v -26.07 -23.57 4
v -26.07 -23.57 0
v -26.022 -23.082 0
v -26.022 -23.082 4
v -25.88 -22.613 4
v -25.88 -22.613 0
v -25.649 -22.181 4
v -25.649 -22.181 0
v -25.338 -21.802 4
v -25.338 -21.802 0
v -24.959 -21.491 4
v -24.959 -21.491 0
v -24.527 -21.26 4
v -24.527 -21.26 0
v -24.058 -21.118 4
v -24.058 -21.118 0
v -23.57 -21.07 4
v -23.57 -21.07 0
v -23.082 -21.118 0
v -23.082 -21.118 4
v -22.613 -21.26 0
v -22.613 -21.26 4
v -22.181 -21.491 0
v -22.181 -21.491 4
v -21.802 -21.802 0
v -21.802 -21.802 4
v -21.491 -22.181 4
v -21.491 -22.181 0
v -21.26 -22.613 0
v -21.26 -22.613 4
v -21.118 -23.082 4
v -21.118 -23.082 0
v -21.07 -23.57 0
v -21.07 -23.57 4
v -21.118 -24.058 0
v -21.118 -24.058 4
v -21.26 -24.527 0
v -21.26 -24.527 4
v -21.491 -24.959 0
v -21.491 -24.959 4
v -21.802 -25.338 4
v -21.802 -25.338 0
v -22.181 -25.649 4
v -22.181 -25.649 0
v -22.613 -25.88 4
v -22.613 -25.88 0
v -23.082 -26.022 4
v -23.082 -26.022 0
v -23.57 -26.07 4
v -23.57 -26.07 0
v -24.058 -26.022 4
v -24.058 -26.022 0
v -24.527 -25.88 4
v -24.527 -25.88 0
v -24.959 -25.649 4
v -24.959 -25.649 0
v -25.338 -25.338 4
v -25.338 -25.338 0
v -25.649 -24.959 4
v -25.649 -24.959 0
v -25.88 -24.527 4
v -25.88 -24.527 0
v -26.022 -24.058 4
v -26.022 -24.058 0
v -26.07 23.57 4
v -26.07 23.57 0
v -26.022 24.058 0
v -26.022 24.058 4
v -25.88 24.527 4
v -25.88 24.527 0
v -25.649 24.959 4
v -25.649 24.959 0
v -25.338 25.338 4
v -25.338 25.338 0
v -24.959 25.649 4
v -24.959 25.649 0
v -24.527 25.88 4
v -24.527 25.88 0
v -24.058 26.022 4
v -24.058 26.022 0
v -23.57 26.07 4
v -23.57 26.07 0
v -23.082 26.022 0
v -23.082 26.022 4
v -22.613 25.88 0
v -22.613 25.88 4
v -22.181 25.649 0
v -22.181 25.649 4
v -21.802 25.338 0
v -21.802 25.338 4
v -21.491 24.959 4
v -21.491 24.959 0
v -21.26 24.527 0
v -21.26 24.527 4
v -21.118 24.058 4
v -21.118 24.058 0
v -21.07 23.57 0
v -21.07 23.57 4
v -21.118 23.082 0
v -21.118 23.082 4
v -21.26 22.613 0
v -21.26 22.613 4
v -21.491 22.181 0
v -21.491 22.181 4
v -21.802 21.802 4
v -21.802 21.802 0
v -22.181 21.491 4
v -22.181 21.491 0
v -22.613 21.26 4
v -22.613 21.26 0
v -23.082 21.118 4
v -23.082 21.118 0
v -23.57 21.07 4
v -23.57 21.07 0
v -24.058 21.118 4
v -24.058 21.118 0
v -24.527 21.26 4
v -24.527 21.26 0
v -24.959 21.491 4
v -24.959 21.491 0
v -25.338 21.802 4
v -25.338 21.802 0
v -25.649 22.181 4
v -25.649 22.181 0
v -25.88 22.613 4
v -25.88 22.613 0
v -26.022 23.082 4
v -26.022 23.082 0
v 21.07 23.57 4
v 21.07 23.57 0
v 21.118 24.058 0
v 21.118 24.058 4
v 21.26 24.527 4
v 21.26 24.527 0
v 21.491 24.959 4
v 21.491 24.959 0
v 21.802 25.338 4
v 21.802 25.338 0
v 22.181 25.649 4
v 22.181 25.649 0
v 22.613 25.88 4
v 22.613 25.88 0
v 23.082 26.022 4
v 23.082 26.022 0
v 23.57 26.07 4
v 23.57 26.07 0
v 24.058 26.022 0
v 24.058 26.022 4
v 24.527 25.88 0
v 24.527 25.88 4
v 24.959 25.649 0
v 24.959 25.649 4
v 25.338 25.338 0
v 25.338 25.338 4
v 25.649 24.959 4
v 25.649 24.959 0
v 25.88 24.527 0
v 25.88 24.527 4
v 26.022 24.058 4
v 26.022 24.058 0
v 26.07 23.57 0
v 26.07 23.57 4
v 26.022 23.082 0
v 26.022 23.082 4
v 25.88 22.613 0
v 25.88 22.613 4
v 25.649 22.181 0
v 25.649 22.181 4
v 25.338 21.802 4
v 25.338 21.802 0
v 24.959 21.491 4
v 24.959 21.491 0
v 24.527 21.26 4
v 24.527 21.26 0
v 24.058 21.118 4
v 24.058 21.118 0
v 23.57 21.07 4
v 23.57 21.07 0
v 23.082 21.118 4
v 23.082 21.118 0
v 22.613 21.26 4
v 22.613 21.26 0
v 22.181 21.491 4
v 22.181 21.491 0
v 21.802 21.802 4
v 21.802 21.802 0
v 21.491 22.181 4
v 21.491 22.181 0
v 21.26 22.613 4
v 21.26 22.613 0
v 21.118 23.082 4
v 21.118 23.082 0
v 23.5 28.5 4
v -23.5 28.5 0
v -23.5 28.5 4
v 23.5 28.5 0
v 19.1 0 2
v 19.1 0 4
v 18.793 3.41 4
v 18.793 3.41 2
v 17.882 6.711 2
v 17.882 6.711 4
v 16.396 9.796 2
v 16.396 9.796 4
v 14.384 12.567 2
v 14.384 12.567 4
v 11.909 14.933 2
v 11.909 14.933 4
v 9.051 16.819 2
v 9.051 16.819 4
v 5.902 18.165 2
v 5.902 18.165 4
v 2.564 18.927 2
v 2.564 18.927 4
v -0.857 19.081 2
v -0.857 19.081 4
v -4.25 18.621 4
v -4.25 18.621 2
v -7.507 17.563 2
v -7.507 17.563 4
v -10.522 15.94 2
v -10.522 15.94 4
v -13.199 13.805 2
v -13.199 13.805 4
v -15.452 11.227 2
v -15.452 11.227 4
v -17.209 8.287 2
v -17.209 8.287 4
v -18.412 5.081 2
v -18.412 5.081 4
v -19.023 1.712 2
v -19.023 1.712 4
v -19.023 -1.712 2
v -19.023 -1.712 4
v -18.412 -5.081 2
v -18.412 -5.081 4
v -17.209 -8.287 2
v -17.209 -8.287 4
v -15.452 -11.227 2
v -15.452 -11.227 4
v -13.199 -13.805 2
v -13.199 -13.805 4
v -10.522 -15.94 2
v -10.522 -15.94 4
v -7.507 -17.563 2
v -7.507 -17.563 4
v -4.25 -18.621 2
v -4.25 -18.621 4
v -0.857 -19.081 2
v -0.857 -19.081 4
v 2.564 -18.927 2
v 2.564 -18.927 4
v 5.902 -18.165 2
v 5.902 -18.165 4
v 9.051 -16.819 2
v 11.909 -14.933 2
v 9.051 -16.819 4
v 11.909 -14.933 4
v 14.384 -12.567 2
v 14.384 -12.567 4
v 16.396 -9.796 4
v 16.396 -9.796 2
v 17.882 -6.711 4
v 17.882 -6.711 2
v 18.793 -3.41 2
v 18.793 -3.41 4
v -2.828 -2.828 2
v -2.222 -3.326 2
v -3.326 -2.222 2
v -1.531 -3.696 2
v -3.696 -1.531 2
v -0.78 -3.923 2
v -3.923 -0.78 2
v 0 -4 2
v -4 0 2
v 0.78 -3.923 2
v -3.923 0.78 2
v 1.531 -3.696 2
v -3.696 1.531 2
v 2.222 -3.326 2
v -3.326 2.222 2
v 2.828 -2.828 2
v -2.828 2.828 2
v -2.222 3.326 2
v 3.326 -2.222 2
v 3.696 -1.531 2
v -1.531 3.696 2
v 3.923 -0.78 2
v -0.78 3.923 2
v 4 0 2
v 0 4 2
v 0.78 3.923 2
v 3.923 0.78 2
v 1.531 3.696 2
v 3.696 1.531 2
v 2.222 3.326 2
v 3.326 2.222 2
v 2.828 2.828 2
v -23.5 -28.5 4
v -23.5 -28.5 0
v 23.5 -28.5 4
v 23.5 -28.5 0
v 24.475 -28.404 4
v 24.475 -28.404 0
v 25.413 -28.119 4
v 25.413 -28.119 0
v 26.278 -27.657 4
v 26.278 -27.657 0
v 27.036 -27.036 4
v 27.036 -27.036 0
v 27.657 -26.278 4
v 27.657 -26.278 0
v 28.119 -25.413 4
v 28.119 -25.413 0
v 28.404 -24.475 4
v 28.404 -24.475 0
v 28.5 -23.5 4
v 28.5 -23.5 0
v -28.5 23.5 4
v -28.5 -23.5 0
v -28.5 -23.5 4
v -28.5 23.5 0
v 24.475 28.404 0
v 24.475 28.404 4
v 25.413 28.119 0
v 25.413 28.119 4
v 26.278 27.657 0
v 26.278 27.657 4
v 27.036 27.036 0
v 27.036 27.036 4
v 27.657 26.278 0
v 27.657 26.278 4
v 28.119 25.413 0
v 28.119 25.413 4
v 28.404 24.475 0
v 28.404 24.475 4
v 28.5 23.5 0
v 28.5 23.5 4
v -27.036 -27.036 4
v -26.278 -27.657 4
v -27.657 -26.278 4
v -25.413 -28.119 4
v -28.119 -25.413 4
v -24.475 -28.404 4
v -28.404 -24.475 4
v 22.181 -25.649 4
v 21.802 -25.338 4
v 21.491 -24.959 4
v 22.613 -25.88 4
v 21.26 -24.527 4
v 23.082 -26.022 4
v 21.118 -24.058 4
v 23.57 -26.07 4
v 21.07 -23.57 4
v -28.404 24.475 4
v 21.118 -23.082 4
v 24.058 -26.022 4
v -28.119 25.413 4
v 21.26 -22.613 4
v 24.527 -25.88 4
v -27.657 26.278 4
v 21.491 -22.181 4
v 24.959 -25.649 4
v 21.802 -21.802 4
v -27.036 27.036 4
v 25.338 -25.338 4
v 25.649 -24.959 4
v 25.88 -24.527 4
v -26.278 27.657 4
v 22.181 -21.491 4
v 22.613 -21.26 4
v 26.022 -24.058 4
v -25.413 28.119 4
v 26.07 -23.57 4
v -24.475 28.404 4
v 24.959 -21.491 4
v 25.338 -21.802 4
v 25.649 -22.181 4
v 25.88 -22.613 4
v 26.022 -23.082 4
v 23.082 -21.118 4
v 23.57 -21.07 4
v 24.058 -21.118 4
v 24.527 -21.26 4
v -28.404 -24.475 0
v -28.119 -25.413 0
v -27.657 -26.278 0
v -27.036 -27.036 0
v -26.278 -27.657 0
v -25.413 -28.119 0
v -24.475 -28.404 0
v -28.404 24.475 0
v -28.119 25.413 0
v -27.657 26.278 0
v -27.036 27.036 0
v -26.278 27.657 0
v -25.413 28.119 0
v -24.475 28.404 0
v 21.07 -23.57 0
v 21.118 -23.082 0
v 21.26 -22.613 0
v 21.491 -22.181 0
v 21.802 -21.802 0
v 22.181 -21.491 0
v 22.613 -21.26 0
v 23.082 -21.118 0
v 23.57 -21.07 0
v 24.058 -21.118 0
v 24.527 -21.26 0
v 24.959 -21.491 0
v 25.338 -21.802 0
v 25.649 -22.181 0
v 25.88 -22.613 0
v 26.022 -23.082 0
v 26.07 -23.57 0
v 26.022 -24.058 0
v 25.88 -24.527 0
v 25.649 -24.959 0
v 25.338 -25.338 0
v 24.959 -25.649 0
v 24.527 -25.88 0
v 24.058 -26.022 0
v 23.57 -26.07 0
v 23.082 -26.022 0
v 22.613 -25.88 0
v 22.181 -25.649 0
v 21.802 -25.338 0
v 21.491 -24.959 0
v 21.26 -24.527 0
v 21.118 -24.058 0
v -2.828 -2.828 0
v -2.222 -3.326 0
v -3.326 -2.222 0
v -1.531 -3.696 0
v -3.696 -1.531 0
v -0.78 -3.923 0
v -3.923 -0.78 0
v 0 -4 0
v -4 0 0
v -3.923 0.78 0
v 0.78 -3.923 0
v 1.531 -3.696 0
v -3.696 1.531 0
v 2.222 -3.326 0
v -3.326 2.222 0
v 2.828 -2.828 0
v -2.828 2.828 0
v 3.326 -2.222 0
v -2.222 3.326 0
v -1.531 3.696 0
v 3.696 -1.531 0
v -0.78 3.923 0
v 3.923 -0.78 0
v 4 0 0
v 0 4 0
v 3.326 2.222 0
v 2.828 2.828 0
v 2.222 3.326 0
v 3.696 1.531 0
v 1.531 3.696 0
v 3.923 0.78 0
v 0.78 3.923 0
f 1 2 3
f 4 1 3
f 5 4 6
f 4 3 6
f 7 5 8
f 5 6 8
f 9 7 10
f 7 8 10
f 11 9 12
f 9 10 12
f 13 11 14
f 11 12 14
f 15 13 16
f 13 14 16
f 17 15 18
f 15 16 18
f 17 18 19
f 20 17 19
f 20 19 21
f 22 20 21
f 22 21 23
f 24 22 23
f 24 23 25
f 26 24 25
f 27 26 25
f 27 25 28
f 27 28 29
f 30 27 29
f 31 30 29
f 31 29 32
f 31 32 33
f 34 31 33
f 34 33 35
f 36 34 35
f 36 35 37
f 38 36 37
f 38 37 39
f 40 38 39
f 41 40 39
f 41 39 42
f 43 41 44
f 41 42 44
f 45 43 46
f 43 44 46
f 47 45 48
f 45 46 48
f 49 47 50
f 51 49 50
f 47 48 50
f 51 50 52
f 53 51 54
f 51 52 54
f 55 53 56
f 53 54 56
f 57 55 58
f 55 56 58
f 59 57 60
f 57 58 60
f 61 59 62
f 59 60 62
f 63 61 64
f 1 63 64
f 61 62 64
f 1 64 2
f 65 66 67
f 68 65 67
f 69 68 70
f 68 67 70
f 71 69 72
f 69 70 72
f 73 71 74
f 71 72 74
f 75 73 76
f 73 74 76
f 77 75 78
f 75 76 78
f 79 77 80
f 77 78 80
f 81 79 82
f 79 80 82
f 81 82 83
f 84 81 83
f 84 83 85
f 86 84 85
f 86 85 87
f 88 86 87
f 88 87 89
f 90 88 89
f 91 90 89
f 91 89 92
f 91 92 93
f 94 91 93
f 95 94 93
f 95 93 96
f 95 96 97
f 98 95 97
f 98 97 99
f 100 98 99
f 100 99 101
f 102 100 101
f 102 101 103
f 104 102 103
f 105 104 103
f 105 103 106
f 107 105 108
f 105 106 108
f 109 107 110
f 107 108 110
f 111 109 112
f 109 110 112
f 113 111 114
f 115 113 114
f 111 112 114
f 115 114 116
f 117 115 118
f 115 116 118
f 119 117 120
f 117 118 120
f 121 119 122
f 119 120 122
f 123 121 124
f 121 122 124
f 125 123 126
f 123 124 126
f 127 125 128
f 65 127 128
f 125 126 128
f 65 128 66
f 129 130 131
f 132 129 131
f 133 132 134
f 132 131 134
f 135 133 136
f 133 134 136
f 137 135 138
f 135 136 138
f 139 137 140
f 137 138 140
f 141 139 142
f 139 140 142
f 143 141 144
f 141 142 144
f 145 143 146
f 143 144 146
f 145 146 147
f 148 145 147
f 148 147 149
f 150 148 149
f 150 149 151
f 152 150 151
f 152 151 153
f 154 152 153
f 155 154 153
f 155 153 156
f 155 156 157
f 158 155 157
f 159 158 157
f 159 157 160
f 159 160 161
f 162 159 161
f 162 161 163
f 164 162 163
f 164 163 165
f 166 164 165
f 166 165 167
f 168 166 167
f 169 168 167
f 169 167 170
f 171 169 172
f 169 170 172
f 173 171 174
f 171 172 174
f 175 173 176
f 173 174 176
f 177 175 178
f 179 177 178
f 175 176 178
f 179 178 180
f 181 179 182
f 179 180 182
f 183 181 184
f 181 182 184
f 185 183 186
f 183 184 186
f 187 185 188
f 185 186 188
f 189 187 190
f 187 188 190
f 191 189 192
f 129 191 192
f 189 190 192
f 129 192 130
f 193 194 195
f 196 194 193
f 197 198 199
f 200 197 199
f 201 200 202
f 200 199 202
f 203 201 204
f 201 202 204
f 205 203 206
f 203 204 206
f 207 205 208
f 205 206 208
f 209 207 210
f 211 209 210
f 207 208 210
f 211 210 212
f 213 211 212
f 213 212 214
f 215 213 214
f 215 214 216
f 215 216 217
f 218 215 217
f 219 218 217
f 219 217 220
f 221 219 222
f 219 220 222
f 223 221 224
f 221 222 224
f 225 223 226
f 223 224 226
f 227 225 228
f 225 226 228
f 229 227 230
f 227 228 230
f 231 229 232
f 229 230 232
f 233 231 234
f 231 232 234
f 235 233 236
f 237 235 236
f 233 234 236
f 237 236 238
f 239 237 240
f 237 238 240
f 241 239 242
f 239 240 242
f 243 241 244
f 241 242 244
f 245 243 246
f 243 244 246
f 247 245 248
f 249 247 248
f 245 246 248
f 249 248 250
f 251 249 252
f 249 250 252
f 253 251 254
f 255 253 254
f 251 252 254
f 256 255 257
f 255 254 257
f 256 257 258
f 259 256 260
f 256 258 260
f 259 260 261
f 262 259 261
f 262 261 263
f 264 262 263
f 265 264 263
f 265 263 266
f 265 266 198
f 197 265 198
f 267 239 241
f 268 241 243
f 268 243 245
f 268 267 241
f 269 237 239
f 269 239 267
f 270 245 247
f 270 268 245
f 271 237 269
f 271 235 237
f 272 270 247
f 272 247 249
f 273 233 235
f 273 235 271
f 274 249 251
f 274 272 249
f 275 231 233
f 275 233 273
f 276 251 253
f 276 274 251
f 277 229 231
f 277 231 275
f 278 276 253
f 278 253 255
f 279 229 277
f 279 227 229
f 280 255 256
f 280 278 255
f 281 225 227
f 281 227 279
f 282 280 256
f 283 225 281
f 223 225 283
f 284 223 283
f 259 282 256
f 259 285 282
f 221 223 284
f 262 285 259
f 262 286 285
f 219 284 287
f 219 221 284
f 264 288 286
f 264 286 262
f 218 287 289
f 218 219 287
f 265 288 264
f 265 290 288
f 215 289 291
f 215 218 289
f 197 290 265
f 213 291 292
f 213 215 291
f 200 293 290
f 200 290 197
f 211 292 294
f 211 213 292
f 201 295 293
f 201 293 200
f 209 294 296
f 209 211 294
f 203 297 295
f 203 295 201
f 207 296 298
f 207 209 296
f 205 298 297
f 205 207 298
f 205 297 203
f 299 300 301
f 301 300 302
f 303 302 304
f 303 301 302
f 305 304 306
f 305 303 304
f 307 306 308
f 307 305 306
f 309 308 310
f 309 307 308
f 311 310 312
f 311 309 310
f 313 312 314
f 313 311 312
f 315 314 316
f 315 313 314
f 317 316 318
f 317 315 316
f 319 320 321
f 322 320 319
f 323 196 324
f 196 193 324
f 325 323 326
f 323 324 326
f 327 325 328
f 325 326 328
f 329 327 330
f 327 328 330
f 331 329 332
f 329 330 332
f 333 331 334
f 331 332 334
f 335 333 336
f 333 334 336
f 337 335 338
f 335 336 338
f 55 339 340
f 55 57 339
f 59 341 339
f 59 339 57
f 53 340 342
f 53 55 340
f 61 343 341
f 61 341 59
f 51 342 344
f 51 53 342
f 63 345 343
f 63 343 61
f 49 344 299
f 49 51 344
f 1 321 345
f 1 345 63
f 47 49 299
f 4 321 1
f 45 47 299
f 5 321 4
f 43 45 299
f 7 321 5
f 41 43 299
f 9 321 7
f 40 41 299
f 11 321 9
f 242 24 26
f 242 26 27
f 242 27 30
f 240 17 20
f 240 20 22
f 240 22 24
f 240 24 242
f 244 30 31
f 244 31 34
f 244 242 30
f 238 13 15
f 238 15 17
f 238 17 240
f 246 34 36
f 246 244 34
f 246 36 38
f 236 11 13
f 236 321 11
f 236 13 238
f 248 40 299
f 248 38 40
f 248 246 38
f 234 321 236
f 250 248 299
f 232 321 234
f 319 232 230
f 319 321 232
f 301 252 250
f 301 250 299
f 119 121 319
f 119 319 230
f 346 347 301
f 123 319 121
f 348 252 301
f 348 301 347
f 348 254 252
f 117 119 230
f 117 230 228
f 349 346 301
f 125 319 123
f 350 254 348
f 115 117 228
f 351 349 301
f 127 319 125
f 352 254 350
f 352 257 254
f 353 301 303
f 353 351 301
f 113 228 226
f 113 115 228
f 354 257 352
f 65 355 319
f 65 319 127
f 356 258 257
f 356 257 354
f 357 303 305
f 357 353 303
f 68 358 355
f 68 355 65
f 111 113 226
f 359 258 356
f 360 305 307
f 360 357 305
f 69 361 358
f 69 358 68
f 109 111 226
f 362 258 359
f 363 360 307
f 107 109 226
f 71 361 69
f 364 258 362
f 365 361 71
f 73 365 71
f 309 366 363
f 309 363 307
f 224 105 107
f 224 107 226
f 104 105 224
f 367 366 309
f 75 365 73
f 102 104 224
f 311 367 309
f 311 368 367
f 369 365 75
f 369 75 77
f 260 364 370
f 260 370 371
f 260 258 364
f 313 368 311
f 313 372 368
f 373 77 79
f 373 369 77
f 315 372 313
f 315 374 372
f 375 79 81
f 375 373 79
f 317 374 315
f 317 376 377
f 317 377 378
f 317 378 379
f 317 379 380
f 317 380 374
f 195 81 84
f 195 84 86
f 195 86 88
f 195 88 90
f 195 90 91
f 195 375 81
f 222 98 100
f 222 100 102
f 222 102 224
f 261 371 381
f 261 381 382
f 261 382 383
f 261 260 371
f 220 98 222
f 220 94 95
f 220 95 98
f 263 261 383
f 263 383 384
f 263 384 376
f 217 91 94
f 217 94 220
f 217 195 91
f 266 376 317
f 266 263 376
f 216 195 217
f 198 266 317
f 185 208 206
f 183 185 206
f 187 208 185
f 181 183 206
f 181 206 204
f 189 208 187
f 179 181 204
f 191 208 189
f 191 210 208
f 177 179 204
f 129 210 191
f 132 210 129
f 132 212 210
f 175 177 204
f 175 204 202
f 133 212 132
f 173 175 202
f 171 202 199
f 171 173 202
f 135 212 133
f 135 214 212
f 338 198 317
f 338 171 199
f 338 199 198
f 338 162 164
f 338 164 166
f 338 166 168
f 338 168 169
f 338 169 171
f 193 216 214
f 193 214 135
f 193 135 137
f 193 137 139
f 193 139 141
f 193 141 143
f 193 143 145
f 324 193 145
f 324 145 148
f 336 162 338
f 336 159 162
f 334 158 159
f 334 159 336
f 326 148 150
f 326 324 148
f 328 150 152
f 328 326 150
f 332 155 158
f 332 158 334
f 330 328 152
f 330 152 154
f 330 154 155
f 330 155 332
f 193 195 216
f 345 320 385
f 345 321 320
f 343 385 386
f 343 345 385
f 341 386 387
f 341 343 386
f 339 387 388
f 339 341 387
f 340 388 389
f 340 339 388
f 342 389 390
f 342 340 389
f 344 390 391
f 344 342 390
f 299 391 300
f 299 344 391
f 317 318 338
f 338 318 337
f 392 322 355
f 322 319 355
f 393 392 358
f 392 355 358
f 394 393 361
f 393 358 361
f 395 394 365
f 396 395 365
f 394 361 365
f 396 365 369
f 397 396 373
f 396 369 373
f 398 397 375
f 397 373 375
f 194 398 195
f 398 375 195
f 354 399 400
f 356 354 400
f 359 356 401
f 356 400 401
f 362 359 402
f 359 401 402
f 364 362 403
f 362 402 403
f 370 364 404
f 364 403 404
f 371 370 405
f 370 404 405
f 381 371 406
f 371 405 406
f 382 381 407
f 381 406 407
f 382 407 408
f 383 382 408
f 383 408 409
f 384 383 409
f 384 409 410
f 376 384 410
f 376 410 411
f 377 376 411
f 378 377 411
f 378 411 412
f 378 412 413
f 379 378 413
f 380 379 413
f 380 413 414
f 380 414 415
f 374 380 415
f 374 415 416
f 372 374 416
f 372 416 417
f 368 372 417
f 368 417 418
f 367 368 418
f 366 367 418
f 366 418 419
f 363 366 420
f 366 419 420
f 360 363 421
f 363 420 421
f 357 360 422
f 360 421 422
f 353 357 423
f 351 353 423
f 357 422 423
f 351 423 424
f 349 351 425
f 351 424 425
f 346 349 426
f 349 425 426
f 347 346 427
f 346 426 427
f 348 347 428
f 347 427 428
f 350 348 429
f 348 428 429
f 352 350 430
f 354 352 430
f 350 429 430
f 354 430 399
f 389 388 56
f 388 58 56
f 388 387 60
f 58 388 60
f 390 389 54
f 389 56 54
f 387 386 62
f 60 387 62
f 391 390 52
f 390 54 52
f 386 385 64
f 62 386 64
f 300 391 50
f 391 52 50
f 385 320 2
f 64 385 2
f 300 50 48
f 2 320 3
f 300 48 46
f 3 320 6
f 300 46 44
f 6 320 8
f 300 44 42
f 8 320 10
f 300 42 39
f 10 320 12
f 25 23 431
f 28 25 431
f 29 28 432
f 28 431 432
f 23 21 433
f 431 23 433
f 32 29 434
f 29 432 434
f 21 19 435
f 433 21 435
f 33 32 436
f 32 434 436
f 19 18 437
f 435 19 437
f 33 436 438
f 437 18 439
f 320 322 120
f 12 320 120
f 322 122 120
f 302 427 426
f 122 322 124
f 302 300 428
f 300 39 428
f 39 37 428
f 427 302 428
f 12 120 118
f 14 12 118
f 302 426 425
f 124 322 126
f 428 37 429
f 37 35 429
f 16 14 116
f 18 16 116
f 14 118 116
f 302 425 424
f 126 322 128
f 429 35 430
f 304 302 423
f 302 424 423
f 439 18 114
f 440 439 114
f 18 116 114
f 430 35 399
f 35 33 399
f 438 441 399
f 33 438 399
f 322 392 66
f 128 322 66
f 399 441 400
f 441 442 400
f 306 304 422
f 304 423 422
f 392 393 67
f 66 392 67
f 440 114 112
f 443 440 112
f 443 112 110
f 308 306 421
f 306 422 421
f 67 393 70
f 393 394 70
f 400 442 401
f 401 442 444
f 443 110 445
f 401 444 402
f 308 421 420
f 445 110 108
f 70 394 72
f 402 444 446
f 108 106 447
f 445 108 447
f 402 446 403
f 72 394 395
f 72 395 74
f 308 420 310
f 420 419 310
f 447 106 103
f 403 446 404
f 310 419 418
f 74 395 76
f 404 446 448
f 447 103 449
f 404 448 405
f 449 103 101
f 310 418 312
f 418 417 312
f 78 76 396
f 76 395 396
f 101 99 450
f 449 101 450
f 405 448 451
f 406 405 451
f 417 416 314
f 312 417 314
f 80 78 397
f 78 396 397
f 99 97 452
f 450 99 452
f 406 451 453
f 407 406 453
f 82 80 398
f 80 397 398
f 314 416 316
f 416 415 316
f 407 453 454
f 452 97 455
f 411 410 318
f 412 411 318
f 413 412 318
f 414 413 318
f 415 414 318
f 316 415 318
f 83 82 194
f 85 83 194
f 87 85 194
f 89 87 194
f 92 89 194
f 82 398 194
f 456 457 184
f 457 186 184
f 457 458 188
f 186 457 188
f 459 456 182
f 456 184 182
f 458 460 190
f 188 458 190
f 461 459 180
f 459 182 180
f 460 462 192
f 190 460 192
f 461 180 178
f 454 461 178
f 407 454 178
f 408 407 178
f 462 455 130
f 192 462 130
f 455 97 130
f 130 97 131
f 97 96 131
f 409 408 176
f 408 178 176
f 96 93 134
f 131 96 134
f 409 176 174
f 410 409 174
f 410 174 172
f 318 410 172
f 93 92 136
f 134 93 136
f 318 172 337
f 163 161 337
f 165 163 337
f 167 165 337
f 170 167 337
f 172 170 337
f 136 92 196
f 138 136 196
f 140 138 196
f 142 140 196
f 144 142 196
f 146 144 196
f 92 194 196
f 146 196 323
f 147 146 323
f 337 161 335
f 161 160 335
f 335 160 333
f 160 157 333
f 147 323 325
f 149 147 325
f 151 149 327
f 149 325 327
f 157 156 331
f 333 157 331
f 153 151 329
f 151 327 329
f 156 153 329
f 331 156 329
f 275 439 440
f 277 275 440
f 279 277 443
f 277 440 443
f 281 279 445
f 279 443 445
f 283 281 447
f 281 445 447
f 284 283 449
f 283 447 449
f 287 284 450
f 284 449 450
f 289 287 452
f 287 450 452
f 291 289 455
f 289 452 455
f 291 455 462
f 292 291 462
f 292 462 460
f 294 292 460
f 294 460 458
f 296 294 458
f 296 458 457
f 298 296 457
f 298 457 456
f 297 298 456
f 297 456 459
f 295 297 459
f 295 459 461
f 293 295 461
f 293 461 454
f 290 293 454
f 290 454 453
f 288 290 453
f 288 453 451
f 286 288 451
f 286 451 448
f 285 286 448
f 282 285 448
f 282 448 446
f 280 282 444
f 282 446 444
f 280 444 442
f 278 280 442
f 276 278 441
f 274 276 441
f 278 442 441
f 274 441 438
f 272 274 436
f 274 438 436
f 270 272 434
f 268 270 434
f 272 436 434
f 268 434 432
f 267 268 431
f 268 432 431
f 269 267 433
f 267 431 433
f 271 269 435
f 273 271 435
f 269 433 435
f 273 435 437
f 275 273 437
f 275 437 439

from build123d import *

# Parameters (mm, degrees)
SKIZZE1_W                       = 57
SKIZZE1_H                       = 57
AUFSATZ_LINEAR_AUSTRAGEN1_DEPTH = 4
F_5_0_5_DURCHMESSER_BOHRUNG2_D  = 5
VERRUNDUNG1_R                   = 5
SKIZZE6_R                       = 19.1
SCHNITT_LINEAR_AUSTRAGEN1_DEPTH = 2
F_8_0_8_DURCHMESSER_BOHRUNG1_D  = 8


with BuildPart() as part:
    # Skizze1 → Aufsatz-Linear austragen1 (new body)
    with BuildSketch(Plane.XY):
        Rectangle(SKIZZE1_W, SKIZZE1_H)
    extrude(amount=AUFSATZ_LINEAR_AUSTRAGEN1_DEPTH)

    # Ø5.0 (5) Durchmesser Bohrung2 (through all)
    with Locations(Plane.XY.offset(4)):
        with Locations((-23.57, 23.57), (23.57, 23.57), (23.57, -23.57), (-23.57, -23.57)):
            Hole(F_5_0_5_DURCHMESSER_BOHRUNG2_D / 2)

    # Verrundung1
    verrundung1_edges = [part.edges().sort_by_distance(p)[0] for p in [
        (28.5, -28.5, 2),
        (-28.5, -28.5, 2),
        (-28.5, 28.5, 2),
        (28.5, 28.5, 2),
    ]]
    fillet(verrundung1_edges, radius=VERRUNDUNG1_R)

    # Skizze6 → Schnitt-Linear austragen1 (cut)
    with BuildSketch(Plane.XY.offset(4)):
        Circle(SKIZZE6_R)
    extrude(amount=-SCHNITT_LINEAR_AUSTRAGEN1_DEPTH, mode=Mode.SUBTRACT)

    # Ø8.0 (8) Durchmesser Bohrung1 (through all)
    with Locations(Plane.XY.offset(2)):
        with Locations((0, 0)):
            Hole(F_8_0_8_DURCHMESSER_BOHRUNG1_D / 2)


solid = part.part
